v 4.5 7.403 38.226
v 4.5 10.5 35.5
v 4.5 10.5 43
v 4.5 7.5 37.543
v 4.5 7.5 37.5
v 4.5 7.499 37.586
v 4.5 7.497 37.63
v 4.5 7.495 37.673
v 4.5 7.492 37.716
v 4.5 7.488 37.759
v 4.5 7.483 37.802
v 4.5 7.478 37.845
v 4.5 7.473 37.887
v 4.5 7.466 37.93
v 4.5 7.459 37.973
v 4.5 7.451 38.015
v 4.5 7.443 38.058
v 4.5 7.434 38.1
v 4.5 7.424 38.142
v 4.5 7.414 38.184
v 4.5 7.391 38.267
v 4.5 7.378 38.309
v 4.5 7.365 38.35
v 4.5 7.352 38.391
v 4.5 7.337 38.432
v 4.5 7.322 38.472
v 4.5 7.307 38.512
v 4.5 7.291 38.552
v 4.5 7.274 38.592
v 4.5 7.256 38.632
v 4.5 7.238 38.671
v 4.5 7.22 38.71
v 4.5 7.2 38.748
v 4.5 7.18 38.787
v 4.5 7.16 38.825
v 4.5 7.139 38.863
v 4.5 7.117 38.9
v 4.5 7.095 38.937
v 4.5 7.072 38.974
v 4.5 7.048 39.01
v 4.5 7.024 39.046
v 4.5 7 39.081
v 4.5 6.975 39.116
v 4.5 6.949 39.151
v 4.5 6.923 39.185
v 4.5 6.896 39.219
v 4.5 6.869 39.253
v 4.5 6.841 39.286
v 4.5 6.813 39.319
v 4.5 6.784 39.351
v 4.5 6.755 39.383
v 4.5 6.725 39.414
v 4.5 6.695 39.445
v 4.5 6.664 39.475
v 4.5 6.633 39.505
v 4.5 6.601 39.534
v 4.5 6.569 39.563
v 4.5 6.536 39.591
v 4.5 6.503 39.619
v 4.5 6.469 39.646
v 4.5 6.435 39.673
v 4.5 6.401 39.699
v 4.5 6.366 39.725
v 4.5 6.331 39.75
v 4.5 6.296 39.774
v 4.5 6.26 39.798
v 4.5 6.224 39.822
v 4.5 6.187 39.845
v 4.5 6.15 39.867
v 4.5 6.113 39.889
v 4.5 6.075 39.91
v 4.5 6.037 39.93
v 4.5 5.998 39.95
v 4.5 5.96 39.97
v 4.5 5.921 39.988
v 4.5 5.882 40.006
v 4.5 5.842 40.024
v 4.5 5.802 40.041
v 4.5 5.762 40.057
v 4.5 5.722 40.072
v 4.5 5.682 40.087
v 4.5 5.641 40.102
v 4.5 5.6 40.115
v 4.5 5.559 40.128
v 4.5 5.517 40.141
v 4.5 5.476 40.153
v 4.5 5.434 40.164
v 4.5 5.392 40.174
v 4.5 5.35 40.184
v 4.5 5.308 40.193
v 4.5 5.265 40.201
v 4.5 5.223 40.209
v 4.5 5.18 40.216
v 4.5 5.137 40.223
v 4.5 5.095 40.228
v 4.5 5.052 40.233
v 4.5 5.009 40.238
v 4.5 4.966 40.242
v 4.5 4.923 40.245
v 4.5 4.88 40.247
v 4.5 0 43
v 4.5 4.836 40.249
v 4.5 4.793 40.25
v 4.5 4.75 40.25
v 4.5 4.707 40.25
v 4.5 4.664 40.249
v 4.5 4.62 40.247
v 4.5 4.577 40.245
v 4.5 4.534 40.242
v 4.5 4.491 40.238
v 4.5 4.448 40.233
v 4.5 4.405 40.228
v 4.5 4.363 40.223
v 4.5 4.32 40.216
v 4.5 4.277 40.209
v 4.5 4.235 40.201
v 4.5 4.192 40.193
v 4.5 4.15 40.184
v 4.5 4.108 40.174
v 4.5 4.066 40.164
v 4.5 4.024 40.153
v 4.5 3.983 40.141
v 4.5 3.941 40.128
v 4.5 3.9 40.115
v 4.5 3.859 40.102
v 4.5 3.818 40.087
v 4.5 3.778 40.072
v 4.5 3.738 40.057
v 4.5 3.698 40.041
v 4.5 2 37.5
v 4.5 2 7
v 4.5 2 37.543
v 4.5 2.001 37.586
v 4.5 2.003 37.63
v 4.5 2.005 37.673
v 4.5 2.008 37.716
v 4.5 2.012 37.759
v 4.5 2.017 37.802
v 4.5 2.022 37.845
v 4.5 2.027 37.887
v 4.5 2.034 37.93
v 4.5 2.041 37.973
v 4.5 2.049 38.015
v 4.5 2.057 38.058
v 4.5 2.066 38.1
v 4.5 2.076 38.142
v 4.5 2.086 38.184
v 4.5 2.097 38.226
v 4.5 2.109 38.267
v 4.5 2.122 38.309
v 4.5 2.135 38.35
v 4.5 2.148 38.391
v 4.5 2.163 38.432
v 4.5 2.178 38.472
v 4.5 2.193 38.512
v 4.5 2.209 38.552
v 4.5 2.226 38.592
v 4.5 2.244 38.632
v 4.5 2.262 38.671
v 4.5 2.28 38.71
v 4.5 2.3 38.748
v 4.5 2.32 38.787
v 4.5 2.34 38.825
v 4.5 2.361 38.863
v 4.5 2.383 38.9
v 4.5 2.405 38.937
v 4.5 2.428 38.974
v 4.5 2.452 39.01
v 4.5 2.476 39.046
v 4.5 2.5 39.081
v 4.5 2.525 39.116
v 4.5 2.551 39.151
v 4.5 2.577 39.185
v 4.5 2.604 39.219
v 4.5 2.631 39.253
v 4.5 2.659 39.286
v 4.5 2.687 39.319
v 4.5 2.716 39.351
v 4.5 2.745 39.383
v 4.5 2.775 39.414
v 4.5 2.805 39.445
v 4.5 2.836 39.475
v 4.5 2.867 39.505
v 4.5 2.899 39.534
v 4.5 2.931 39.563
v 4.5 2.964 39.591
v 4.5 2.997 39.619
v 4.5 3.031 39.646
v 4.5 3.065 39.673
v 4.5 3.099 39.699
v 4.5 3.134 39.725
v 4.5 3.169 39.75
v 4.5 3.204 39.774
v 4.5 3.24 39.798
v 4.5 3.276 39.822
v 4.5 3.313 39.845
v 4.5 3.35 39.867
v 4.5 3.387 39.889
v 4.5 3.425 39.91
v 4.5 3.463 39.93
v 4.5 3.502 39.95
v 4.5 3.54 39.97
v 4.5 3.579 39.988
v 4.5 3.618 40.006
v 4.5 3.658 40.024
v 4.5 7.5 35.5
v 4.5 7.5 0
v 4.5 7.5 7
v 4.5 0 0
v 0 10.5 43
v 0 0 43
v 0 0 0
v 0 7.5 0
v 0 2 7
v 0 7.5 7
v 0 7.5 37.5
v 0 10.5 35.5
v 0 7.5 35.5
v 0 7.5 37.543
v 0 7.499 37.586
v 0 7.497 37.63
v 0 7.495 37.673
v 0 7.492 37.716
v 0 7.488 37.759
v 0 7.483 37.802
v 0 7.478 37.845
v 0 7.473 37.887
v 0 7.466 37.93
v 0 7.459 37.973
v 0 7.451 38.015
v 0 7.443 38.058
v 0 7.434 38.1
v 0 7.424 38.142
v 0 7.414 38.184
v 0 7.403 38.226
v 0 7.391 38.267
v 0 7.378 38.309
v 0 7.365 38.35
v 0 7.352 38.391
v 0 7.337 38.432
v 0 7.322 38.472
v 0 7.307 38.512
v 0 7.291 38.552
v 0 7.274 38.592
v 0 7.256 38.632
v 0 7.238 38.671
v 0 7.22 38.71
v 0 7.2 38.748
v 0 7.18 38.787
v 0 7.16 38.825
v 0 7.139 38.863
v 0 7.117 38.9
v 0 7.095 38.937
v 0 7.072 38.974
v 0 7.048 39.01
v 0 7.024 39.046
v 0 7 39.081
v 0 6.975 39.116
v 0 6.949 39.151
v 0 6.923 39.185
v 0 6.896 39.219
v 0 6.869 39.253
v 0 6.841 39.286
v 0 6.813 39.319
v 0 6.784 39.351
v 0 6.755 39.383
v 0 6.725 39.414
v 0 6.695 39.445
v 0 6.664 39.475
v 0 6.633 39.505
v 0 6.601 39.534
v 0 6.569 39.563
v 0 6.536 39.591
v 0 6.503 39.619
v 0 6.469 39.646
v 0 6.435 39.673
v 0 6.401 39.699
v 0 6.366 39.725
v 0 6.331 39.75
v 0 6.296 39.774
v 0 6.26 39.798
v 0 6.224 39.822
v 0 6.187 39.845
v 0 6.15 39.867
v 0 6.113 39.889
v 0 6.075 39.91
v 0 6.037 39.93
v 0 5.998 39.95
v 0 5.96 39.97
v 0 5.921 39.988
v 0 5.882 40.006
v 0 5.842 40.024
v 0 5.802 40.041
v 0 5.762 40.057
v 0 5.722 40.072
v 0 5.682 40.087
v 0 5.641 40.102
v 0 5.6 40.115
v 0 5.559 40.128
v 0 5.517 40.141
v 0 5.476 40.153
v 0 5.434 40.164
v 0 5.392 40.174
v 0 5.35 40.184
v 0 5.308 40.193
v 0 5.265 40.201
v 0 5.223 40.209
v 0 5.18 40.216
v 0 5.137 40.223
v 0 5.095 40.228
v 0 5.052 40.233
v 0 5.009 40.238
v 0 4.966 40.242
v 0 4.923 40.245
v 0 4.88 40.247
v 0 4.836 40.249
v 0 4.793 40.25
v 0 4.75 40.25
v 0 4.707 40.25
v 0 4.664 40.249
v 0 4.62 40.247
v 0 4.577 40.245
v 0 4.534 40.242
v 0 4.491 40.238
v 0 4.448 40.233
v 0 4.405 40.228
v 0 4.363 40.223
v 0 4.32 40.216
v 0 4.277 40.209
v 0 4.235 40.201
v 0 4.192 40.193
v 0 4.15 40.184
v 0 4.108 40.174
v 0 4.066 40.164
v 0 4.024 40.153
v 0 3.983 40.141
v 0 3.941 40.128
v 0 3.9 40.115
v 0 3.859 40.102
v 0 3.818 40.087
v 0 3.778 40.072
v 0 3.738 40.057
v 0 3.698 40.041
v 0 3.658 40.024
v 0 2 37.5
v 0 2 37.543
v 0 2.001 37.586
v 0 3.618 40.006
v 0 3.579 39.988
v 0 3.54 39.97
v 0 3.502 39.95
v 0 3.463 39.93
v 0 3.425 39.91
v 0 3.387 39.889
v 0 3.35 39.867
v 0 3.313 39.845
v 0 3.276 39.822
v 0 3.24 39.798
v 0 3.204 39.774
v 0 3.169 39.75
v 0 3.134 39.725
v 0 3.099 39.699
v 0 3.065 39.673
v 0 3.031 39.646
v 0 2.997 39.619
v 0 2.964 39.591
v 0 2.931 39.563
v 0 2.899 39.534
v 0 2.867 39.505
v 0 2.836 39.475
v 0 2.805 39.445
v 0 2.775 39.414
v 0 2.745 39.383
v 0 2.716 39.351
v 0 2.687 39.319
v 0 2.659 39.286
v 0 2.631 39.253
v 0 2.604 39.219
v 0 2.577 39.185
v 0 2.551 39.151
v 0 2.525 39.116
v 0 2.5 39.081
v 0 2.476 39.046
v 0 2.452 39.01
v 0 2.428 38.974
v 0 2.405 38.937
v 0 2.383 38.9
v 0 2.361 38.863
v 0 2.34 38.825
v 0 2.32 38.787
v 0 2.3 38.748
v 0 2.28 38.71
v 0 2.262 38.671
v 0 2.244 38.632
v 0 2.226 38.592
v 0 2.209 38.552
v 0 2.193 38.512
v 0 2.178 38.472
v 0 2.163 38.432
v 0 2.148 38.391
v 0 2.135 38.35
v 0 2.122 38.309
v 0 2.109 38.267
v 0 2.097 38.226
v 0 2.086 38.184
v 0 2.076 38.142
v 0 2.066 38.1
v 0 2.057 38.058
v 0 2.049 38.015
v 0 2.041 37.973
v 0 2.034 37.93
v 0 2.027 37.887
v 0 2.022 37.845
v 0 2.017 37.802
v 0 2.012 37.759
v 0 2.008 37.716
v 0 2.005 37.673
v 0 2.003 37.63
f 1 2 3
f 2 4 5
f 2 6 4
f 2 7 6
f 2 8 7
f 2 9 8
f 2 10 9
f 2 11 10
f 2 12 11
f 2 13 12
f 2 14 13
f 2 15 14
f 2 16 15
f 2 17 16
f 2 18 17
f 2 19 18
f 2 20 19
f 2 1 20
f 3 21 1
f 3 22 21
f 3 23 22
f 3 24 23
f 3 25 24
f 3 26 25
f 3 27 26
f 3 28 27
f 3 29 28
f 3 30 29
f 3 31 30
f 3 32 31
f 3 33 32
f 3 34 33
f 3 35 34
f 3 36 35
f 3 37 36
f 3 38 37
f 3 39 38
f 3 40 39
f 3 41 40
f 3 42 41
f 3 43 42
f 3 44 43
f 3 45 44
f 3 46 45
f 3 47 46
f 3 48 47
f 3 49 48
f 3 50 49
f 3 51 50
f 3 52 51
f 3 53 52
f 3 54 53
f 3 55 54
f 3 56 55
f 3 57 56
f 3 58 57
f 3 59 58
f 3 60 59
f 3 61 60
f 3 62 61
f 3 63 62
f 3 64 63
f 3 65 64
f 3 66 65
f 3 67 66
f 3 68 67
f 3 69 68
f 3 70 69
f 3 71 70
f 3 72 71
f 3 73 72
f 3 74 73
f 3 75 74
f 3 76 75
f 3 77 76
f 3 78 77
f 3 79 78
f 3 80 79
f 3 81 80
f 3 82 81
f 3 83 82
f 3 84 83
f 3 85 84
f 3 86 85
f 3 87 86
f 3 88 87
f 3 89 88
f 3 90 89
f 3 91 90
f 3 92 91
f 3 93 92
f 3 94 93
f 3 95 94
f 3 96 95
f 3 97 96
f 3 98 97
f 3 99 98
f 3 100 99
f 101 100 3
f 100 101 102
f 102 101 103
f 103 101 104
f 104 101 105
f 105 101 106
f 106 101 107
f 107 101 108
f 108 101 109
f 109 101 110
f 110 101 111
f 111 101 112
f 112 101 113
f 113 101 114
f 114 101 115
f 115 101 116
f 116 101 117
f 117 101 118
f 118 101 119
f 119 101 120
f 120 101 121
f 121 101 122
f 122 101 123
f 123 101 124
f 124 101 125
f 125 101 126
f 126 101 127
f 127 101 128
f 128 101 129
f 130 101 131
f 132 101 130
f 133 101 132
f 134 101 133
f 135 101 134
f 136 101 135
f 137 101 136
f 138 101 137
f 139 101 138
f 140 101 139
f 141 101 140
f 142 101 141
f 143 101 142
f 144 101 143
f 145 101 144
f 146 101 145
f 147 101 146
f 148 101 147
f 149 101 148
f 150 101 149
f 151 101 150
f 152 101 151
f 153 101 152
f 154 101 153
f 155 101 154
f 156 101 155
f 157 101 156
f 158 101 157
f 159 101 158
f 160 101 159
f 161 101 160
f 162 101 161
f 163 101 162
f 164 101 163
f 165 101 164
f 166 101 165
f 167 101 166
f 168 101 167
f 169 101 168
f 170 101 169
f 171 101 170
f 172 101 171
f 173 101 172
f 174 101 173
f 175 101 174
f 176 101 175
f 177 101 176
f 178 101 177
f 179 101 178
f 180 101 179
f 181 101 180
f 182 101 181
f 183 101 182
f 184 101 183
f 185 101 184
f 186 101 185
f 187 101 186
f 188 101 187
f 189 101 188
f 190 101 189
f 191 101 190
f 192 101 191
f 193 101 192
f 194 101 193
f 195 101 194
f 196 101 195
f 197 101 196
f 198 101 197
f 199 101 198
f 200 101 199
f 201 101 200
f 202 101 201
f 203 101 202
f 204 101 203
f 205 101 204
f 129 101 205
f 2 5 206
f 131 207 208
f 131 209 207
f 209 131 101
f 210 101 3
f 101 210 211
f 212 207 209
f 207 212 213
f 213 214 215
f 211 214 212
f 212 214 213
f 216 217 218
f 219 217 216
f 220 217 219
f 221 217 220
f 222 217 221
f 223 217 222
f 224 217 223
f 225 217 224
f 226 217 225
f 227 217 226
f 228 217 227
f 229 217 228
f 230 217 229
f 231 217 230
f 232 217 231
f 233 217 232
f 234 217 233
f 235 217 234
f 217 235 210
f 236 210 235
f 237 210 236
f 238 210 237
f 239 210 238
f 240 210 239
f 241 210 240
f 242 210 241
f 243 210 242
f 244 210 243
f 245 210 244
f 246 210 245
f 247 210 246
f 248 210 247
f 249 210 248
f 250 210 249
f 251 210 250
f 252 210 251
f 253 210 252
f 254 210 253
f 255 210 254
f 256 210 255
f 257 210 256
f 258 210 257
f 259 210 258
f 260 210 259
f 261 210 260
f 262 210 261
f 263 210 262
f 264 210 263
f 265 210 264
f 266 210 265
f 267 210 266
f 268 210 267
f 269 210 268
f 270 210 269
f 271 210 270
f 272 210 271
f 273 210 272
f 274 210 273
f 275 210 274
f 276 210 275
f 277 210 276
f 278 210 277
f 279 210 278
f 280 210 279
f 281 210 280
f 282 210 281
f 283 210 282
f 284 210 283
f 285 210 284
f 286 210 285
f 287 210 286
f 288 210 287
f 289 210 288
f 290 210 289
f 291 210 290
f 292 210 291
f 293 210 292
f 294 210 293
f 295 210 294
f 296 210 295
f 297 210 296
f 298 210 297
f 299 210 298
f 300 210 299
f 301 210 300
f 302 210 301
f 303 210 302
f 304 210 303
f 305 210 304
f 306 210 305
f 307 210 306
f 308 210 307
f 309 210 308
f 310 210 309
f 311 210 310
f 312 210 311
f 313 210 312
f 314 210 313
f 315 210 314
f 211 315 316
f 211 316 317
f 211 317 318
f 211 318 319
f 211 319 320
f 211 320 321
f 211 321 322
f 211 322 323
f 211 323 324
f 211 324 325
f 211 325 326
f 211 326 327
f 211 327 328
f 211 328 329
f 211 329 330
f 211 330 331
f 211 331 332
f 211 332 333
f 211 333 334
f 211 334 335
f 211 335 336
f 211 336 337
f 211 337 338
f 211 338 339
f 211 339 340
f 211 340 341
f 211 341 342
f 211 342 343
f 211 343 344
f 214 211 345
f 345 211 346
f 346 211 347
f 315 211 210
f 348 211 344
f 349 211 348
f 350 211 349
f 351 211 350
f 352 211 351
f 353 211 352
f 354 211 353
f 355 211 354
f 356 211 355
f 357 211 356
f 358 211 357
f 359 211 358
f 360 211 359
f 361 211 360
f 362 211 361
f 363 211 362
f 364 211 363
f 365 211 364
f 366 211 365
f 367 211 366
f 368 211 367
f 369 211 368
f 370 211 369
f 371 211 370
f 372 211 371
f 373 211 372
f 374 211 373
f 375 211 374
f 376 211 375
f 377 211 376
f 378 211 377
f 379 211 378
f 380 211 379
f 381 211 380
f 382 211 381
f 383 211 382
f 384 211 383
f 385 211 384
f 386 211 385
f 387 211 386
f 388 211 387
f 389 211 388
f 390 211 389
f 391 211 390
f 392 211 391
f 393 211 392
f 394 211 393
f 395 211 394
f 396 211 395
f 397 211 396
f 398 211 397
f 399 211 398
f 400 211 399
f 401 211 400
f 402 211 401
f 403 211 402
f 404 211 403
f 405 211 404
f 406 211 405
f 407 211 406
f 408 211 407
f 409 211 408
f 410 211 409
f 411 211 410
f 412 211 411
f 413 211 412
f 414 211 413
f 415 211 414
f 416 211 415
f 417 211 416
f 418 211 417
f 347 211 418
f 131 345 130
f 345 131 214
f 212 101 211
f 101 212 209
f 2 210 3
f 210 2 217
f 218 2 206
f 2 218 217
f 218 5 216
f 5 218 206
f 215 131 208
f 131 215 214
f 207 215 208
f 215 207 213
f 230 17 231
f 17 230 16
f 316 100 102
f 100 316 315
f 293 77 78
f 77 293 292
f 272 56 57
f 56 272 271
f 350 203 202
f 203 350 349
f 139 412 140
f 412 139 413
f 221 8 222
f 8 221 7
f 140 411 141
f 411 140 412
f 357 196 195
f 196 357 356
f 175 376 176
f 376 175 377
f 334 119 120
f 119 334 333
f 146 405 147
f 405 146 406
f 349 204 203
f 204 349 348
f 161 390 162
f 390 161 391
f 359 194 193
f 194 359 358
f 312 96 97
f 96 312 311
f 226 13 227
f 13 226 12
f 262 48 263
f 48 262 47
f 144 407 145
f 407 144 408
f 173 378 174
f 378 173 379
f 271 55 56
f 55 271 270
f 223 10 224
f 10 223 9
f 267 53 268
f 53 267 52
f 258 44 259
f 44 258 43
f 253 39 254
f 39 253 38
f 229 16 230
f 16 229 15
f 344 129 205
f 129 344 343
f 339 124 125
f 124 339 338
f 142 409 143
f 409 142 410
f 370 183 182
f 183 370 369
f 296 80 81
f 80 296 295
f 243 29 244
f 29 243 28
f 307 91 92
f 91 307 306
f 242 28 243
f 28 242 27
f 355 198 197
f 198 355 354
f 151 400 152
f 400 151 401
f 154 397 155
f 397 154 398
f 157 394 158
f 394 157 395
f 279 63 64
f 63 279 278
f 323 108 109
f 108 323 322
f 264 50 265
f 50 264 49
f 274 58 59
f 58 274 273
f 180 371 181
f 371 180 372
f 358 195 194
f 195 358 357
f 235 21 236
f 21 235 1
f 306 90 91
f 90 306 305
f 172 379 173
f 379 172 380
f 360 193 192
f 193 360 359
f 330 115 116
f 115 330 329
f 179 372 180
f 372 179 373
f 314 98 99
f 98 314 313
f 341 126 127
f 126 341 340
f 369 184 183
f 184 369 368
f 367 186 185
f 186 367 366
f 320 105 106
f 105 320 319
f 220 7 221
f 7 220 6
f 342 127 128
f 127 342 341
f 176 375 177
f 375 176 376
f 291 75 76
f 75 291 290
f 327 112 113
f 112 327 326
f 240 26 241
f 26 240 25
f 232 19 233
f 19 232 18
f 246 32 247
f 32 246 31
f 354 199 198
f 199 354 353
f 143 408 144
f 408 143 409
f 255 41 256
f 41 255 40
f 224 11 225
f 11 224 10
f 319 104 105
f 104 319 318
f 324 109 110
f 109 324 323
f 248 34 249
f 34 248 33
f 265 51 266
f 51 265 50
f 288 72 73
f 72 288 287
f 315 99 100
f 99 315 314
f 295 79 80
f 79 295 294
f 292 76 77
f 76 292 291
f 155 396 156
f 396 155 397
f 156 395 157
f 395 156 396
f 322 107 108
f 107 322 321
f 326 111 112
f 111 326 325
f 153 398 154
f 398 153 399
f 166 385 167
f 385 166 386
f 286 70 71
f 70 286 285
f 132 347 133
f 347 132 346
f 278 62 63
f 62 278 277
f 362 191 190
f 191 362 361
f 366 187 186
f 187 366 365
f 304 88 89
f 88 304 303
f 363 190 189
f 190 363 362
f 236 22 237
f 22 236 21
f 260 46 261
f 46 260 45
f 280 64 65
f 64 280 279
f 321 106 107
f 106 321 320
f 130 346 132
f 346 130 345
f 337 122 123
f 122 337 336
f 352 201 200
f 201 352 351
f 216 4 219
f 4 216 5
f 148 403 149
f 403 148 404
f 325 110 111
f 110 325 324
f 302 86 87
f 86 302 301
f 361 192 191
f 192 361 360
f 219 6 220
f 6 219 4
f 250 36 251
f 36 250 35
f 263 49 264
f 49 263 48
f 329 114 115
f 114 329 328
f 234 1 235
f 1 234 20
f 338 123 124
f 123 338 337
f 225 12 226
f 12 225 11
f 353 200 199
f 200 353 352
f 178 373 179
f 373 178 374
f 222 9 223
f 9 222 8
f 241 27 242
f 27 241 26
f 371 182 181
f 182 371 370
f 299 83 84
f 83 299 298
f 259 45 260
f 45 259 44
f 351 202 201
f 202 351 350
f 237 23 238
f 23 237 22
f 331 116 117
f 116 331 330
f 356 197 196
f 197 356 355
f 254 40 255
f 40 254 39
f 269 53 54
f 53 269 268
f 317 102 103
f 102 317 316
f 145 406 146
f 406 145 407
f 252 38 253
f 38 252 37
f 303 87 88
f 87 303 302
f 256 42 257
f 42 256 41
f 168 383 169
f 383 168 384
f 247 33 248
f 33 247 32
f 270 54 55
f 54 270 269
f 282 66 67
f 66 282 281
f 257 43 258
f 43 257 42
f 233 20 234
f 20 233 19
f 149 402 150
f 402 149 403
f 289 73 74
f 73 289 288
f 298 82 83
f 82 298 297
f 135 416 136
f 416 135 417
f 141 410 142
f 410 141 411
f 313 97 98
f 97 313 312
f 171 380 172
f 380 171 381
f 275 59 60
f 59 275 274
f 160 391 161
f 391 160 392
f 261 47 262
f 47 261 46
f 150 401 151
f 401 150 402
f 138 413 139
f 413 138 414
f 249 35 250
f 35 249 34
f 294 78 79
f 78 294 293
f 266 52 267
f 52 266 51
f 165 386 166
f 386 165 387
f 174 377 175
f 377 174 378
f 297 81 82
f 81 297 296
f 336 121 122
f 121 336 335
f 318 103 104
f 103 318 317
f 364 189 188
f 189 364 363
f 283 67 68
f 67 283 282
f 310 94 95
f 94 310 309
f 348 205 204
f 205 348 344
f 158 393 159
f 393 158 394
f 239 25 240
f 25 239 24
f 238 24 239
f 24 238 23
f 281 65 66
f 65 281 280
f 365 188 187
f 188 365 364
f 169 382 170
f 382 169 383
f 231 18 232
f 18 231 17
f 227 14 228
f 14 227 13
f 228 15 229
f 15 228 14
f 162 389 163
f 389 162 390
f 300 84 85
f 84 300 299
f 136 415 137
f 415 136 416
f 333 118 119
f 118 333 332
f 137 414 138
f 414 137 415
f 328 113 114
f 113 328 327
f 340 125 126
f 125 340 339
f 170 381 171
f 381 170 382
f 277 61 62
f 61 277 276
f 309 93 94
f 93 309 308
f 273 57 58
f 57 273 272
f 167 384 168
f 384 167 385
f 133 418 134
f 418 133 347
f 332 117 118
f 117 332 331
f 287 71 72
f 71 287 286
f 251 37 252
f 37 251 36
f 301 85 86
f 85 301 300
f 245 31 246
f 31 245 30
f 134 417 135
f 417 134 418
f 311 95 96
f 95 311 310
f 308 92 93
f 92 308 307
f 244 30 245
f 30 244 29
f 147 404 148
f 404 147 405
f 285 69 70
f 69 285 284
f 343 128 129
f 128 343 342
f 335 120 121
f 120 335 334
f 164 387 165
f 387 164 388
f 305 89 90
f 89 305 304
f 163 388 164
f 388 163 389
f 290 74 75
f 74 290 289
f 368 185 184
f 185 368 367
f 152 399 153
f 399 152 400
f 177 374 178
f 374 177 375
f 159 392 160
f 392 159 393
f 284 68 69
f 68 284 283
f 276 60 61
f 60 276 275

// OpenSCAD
$fn=400;

sh_height=43;
sh_width=4.5;
sh_hanger_spacing=5.5;
sh_material_size=2;
sh_short_tail=2;

module ikea_skadis_holder() {
    difference() {
        union() {
            
            //Vertical wall
            color("green")
            cube([sh_width,sh_material_size,sh_height]);
            
            // Retainer
            color("blue")
            translate([0,0,sh_height-sh_hanger_spacing])
            cube([sh_width,sh_hanger_spacing+sh_material_size*2+1,sh_hanger_spacing]);
            
            //Vertical wall (short)
            color("cyan")
            translate([0, sh_hanger_spacing+sh_material_size,sh_height-sh_short_tail-sh_hanger_spacing])
            cube([sh_width,sh_material_size+1,sh_short_tail]);

            //Schnöpsel
            color("yellow")
            translate([0, sh_material_size,0])
            cube([sh_width,sh_hanger_spacing,7]);
        }
        
        
    color("red")
    translate([-1,sh_material_size+sh_hanger_spacing/2,sh_height-sh_hanger_spacing])
    rotate([0,90,0])
    cylinder(sh_width+2, sh_hanger_spacing/2, sh_hanger_spacing/2);
        
    }
}
ikea_skadis_holder();
